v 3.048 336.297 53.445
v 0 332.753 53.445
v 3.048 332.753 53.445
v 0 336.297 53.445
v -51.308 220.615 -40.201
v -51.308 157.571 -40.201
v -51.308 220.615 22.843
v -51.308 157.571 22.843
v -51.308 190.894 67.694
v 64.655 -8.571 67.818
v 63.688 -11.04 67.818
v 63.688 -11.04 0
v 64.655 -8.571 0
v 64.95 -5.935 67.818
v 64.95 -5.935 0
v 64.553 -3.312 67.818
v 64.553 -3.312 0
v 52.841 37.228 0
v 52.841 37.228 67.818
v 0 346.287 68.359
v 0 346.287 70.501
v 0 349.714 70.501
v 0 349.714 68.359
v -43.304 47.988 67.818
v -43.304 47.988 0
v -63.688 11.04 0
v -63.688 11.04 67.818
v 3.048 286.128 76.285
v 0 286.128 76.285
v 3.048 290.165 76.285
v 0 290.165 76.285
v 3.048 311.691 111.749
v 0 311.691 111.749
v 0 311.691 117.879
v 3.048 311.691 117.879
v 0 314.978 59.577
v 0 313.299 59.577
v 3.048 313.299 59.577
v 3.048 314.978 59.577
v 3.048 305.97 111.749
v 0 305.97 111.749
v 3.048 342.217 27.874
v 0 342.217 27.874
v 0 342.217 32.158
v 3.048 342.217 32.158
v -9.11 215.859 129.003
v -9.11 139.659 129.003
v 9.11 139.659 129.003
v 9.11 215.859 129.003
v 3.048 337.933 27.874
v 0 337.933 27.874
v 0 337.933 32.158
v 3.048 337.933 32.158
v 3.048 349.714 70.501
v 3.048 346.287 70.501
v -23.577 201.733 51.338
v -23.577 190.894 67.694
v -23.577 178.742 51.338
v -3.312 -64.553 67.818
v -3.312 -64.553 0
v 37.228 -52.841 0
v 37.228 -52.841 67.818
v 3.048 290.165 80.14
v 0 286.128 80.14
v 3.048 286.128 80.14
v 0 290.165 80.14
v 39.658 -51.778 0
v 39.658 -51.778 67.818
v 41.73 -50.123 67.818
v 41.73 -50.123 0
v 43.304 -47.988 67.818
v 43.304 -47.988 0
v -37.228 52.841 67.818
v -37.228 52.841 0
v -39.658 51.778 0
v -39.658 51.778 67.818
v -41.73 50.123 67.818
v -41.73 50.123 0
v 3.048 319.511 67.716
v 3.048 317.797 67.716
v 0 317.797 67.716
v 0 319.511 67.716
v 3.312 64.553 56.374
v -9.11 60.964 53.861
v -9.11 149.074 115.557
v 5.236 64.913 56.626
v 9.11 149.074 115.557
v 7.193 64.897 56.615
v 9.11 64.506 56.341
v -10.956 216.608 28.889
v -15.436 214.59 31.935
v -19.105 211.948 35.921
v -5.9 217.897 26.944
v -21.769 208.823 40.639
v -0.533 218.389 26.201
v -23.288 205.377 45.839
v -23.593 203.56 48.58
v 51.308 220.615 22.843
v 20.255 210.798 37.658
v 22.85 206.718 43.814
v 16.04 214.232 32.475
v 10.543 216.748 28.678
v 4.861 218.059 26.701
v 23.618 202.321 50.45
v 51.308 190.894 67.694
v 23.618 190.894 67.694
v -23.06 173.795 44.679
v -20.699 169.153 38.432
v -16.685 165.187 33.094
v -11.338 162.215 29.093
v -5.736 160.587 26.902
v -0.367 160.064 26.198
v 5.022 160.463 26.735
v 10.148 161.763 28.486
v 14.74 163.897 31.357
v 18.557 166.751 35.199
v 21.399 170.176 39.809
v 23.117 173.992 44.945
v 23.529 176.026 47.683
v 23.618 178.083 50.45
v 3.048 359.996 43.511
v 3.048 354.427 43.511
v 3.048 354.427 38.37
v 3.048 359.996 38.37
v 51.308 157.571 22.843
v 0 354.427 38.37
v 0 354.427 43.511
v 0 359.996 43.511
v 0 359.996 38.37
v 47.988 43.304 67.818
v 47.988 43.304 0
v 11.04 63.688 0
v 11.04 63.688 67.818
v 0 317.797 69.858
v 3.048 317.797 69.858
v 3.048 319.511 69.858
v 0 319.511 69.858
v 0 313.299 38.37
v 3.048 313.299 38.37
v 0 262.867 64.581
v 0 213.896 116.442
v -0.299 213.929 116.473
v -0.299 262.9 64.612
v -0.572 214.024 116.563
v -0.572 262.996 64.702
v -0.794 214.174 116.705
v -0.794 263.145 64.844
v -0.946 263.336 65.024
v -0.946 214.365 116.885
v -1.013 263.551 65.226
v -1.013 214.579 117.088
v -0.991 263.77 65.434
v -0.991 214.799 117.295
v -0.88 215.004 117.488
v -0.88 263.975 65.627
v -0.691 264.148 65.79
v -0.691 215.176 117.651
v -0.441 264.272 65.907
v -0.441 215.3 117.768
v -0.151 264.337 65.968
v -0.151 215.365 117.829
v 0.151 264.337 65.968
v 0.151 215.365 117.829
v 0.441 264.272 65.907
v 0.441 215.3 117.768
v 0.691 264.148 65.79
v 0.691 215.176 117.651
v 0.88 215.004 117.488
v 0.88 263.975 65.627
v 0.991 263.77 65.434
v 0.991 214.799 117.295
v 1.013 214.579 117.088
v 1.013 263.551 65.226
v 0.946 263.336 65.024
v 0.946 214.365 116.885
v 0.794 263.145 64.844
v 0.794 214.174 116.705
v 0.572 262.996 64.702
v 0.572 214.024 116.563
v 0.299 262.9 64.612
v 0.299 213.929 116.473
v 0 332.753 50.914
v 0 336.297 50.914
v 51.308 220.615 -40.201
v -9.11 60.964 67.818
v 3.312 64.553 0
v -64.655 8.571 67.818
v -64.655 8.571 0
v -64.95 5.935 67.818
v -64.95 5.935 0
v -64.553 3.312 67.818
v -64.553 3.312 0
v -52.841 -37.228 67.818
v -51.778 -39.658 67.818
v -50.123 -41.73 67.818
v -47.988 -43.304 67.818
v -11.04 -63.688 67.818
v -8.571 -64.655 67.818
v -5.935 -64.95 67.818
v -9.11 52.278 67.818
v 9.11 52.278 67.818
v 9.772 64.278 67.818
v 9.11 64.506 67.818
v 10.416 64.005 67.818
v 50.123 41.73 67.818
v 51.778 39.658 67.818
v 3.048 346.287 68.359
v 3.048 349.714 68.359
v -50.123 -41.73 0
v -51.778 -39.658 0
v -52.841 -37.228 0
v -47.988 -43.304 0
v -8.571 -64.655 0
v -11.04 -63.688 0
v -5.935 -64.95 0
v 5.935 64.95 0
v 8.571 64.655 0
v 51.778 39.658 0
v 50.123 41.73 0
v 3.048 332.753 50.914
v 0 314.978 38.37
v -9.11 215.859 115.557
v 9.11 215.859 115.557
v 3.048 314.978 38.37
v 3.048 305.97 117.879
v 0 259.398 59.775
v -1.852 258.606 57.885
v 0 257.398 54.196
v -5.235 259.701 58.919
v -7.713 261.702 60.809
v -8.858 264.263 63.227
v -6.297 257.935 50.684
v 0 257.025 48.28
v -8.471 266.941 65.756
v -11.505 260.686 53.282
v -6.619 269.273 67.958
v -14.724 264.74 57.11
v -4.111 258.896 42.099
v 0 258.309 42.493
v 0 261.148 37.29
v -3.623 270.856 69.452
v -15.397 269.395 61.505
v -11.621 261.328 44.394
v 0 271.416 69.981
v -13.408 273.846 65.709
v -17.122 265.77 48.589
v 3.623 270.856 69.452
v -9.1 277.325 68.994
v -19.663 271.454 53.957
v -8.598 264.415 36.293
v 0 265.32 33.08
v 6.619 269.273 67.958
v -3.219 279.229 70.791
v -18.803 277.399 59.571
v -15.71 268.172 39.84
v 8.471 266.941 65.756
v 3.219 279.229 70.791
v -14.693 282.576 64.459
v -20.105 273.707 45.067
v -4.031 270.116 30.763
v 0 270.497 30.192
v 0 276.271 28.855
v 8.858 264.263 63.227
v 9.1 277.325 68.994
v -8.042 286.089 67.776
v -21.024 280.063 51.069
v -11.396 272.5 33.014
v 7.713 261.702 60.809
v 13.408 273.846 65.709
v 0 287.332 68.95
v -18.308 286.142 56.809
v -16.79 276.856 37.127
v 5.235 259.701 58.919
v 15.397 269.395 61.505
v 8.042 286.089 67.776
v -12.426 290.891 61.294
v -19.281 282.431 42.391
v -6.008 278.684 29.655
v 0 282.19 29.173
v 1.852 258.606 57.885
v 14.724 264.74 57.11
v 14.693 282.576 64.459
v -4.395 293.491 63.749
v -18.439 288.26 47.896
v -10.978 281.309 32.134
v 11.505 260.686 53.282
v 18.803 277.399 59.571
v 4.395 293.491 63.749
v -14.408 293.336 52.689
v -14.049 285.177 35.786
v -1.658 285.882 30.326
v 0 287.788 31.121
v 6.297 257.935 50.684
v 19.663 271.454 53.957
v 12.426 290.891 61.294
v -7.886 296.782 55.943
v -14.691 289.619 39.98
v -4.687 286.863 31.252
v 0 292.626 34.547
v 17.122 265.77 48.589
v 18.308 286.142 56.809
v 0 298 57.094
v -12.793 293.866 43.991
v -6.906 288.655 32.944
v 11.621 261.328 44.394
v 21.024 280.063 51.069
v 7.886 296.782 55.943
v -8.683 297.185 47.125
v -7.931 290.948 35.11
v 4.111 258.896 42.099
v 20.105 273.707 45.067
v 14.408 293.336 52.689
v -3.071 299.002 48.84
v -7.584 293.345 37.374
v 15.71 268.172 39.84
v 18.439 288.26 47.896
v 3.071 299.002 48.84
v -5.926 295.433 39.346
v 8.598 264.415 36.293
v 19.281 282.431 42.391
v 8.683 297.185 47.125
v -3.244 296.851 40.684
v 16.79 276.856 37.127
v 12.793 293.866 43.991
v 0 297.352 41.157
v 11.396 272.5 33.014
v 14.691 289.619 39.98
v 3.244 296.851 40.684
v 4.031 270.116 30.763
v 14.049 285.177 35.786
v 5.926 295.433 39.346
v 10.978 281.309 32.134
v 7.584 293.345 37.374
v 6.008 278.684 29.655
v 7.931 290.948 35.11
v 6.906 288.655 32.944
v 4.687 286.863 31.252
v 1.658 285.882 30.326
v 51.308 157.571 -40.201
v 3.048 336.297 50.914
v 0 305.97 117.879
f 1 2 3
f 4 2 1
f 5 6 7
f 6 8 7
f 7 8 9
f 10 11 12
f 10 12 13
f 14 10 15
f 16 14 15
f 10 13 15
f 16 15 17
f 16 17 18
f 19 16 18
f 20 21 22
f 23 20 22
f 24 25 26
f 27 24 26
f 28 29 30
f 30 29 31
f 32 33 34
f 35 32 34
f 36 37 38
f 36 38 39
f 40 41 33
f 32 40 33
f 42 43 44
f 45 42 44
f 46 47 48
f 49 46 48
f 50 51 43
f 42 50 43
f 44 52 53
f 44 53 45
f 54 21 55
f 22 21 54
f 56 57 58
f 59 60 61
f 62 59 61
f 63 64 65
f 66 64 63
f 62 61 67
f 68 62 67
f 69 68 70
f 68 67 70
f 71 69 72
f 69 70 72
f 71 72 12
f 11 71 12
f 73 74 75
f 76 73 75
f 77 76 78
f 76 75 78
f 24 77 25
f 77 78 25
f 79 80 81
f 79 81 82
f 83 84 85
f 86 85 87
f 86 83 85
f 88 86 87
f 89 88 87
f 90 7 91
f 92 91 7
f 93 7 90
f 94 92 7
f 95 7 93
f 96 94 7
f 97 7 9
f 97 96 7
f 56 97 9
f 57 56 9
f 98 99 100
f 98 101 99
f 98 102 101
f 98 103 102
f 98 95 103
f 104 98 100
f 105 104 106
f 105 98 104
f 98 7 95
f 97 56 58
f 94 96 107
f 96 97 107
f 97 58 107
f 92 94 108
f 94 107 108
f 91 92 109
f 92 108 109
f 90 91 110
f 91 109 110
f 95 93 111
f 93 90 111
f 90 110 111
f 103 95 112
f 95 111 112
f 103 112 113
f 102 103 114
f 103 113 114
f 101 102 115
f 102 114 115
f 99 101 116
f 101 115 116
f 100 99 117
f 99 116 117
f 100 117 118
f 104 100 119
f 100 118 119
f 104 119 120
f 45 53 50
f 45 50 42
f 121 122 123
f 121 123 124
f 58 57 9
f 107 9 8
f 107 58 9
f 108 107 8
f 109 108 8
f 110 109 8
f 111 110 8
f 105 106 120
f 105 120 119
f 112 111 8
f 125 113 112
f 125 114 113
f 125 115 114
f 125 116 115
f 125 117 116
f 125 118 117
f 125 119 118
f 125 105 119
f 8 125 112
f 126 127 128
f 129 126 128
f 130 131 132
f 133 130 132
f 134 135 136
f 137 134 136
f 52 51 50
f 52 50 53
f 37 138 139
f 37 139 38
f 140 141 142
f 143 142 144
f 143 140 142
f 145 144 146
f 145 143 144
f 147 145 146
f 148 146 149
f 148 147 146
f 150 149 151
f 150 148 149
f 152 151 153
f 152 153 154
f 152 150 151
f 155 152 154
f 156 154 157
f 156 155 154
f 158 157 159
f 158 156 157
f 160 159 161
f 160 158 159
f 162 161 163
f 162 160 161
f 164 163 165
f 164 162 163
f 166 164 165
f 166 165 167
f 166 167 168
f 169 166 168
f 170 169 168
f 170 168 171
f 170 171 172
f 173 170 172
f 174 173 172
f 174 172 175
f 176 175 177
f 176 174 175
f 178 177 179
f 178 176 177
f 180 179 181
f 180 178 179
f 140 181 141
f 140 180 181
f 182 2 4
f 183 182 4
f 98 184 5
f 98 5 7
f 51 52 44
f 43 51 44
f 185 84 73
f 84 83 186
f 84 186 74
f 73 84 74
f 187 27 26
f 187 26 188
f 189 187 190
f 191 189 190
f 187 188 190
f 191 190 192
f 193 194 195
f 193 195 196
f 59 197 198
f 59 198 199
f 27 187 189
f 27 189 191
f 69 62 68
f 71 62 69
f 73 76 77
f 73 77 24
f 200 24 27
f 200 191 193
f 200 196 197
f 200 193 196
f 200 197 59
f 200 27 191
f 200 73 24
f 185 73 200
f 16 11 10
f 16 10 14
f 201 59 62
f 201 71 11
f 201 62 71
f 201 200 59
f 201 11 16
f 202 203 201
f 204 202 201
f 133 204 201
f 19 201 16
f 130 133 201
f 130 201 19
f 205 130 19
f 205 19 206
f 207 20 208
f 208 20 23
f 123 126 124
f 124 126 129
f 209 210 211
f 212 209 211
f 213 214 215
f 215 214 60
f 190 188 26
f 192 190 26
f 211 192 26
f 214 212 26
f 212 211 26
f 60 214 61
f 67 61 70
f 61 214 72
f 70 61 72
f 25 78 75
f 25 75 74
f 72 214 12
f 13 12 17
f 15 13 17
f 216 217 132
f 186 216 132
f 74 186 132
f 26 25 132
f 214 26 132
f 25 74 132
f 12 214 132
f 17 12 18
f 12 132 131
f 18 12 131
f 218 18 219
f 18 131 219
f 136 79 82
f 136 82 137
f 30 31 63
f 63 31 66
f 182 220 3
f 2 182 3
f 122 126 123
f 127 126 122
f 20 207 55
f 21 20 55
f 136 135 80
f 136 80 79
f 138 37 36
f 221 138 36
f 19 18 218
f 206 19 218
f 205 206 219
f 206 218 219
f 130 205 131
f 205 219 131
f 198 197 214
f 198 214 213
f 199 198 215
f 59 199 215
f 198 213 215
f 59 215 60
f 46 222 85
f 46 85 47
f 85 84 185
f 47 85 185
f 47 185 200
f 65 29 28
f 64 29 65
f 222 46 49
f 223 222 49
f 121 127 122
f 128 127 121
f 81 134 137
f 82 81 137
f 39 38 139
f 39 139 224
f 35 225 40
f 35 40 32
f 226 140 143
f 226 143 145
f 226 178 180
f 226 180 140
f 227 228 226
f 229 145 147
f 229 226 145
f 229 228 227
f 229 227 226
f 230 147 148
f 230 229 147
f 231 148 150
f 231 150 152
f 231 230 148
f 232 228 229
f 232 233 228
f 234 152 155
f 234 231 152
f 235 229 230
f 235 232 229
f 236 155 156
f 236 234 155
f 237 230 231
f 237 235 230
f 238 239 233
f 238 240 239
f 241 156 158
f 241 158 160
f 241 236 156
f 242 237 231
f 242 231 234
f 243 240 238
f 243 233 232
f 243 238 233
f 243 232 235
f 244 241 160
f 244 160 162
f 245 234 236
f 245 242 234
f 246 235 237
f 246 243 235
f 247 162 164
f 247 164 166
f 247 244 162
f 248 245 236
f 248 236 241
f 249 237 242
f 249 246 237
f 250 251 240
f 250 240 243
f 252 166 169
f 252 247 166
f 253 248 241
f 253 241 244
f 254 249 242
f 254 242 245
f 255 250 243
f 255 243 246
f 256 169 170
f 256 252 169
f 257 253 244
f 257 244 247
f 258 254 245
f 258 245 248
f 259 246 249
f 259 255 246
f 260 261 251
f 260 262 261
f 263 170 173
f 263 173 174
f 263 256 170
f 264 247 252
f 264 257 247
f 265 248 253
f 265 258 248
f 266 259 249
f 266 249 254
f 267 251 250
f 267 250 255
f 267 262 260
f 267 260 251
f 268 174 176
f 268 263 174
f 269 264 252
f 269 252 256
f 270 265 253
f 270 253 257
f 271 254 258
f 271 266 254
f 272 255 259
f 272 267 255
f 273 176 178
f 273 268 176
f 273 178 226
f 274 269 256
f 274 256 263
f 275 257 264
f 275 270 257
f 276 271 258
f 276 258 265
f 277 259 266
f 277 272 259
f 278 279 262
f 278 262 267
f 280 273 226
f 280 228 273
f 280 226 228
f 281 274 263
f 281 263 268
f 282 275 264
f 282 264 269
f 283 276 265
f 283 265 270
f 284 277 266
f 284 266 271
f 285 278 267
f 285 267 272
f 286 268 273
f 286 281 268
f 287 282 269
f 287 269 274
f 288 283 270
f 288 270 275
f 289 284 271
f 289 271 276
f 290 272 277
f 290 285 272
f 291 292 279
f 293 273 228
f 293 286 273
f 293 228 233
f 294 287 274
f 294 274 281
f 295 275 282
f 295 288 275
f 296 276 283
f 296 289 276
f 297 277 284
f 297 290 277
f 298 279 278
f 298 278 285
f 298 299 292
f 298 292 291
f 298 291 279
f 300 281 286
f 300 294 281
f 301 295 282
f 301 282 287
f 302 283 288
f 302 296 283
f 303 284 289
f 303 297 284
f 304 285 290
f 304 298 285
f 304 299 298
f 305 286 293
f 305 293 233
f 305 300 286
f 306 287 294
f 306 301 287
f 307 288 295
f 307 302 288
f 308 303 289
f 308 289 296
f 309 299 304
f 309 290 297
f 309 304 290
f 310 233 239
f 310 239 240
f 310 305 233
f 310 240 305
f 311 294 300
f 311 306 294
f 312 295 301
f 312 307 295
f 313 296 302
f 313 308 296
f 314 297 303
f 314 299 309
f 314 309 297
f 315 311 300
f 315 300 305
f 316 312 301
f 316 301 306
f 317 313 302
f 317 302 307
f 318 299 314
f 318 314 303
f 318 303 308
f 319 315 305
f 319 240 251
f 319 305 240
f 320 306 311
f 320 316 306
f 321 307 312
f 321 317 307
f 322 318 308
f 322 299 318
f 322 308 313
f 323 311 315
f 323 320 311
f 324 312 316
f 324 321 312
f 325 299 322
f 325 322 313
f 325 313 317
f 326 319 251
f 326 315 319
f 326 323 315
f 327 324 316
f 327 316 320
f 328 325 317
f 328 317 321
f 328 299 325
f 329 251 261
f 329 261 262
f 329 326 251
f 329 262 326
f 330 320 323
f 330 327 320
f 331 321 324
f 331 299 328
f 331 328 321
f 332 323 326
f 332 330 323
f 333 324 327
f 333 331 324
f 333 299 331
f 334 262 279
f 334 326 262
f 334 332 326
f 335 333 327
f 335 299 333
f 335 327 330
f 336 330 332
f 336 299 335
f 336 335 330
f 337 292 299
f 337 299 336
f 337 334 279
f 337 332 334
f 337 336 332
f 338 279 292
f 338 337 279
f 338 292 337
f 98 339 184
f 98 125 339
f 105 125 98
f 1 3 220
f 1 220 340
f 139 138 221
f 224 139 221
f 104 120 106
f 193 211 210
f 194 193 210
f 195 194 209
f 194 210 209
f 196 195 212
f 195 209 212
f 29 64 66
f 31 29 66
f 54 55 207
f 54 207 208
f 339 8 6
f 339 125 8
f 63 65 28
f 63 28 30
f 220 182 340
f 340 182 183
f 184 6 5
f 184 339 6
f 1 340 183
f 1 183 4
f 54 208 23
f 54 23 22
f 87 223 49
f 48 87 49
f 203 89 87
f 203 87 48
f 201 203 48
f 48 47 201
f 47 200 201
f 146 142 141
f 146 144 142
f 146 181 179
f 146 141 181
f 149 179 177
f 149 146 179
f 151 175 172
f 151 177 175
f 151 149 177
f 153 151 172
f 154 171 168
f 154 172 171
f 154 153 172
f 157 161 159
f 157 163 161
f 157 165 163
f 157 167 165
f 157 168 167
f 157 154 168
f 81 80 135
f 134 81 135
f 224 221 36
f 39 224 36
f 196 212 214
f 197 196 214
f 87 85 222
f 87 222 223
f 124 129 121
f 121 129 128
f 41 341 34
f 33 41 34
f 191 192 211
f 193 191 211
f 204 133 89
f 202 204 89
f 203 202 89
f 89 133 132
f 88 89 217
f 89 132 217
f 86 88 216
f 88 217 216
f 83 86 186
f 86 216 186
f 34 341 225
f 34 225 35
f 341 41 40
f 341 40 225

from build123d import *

# Parameters (mm, degrees)
F1_DEPTH      = 67.818
F4_W          = 18.2206444442
F4_H          = 16.4148422464
F5_DEPTH      = 35.052
F5_DEPTH_BACK = 81.28
F7_W          = 18.2206444442
F7_H          = 13.4462515828
F8_DEPTH      = 76.2
F12_DEPTH     = 51.308
F14_DEPTH     = 307.34
F15_W         = 3.5439252173
F15_H         = 2.5313720107
F16_DEPTH     = 3.048
F15_W_2       = 5.5693387985
F15_H_2       = 5.1409378648
F15_W_3       = 4.2840838432
F15_H_3       = 4.2841136456
F15_W_4       = 1.7136335373
F15_H_4       = 2.1420568228
F15_W_5       = 1.678943634
F15_H_5       = 21.2063714862
F15_W_6       = 4.0373813916
F15_H_6       = 3.8556978106
F15_W_7       = 3.4273266792
F15_W_8       = 5.7214427742
F15_H_7       = 6.1301365495


with BuildPart() as f1:
    # F0 (on Top) → F1 (new body)
    with BuildSketch(Plane.XY):
        with BuildLine():
            Line((-3.3124033153, -64.5529893688), (37.227621348, -52.8409373586))
            ThreePointArc((37.227621348, -52.8409373586), (40.7482742502, -51.0188053655), (43.3036336822, -47.9880793748))
            Line((43.3036336822, -47.9880793748), (63.6880886331, -11.0402816279))
            ThreePointArc((63.6880886331, -11.0402816279), (64.8891242859, -7.262362198), (64.5529893688, -3.3124033153))
            Line((64.5529893688, -3.3124033153), (52.8409373586, 37.227621348))
            ThreePointArc((52.8409373586, 37.227621348), (51.0188053655, 40.7482742502), (47.9880793748, 43.3036336822))
            Line((47.9880793748, 43.3036336822), (11.0402816279, 63.6880886331))
            ThreePointArc((11.0402816279, 63.6880886331), (7.262362198, 64.8891242859), (3.3124033153, 64.5529893688))
            Line((3.3124033153, 64.5529893688), (-37.227621348, 52.8409373586))
            ThreePointArc((-37.227621348, 52.8409373586), (-40.7482742502, 51.0188053655), (-43.3036336822, 47.9880793748))
            Line((-43.3036336822, 47.9880793748), (-63.6880886331, 11.0402816279))
            ThreePointArc((-63.6880886331, 11.0402816279), (-64.8891242859, 7.262362198), (-64.5529893688, 3.3124033153))
            Line((-64.5529893688, 3.3124033153), (-52.8409373586, -37.227621348))
            ThreePointArc((-52.8409373586, -37.227621348), (-51.0188053655, -40.7482742502), (-47.9880793748, -43.3036336822))
            Line((-47.9880793748, -43.3036336822), (-11.0402816279, -63.6880886331))
            ThreePointArc((-11.0402816279, -63.6880886331), (-7.262362198, -64.8891242859), (-3.3124033153, -64.5529893688))
        make_face()
    extrude(amount=F1_DEPTH)

    # F4 (on line) → F5 (join, two sides)
    with BuildSketch(Plane(origin=(0, 87.7434991713, 61.4386595487), x_dir=(1, 0, 0), z_dir=(0, -0.8191520443, -0.5735764364))) as f5_sk:
        with Locations((0, 17.3605981536)):
            Rectangle(F4_W, F4_H)
    extrude(amount=F5_DEPTH)
    extrude(f5_sk.sketch, amount=-F5_DEPTH_BACK)

    # F7 (on plane+point) → F8 (join)
    with BuildSketch(Plane.XZ.offset(-139.6589639498)):
        with Locations((0, 122.2799217629)):
            Rectangle(F7_W, F7_H)
    extrude(amount=-F8_DEPTH)


with BuildPart() as f10:
    # F9 (on Right) → F10 (revolve)
    with BuildSketch(Plane.YZ):
        with BuildLine():
            Line((213.895842433, 116.4420843124), (262.8673623017, 64.581070459))
            ThreePointArc((262.8673623017, 64.581070459), (263.0859847021, 35.038088053), (292.6256896875, 34.5467281301))
            Line((292.6256896875, 34.5467281301), (278.1074935259, 49.9215495422))
            Line((278.1074935259, 49.9215495422), (214.6345443587, 117.1396286399))
            Line((214.6345443587, 117.1396286399), (213.895842433, 116.4420843124))
        make_face()
    revolve(axis=Axis((0, 246.3710189423, 83.5305890911), (0, 0.6865618304, -0.7270714222)))


with BuildPart() as f12:
    # F11 (on Right) → F12 (new body, symmetric)
    with BuildSketch(Plane.YZ):
        Polygon((157.5710592777, -40.2006159251), (220.6147791832, -40.2006159251), (220.6147791832, 22.8431193803), (190.8941715956, 67.6941946149), (157.5710592777, 22.8431193803), align=None)
    extrude(amount=F12_DEPTH, both=True)

    # F13 (on Front) → F14 (cut)
    with BuildSketch(Plane.XZ):
        with BuildLine():
            Line((-23.5774199521, 92.2675209238), (-23.5774199521, 51.3375234856))
            ThreePointArc((-23.5774199521, 51.3375234856), (-0.4440142616, 26.1994476979), (23.6177416804, 50.4504108568))
            Line((23.6177416804, 50.4504108568), (23.6177416804, 86.8789901563))
            Line((23.6177416804, 86.8789901563), (-23.5774199521, 92.2675209238))
        make_face()
    extrude(amount=-F14_DEPTH, mode=Mode.SUBTRACT)


with BuildPart() as f16:
    # F15 (on Right) → F16 (new body)
    with BuildSketch(Plane.YZ):
        with Locations((334.5247149807, 52.1797649562)):
            Rectangle(F15_W, F15_H)
    extrude(amount=F16_DEPTH)


with BuildPart() as f16b:
    # F15 (on Right) → F16, piece 2 (new body)
    with BuildSketch(Plane.YZ):
        with Locations((357.2113215923, 40.9406758845)):
            Rectangle(F15_W_2, F15_H_2)
    extrude(amount=F16_DEPTH)


with BuildPart() as f16c:
    # F15 (on Right) → F16, piece 3 (new body)
    with BuildSketch(Plane.YZ):
        with Locations((340.0748670101, 30.0161801279)):
            Rectangle(F15_W_3, F15_H_3)
    extrude(amount=F16_DEPTH)


with BuildPart() as f16d:
    # F15 (on Right) → F16, piece 4 (new body)
    with BuildSketch(Plane.YZ):
        with Locations((318.6542987823, 68.7874257565)):
            Rectangle(F15_W_4, F15_H_4)
    extrude(amount=F16_DEPTH)


with BuildPart() as f16e:
    # F15 (on Right) → F16, piece 5 (new body)
    with BuildSketch(Plane.YZ):
        with Locations((314.1385912895, 48.9733926952)):
            Rectangle(F15_W_5, F15_H_5)
    extrude(amount=F16_DEPTH)


with BuildPart() as f16f:
    # F15 (on Right) → F16, piece 6 (new body)
    with BuildSketch(Plane.YZ):
        with Locations((288.1462270116, 78.2124809921)):
            Rectangle(F15_W_6, F15_H_6)
    extrude(amount=F16_DEPTH)


with BuildPart() as f16g:
    # F15 (on Right) → F16, piece 7 (new body)
    with BuildSketch(Plane.YZ):
        with Locations((348.0004966259, 69.4300457835)):
            Rectangle(F15_W_7, F15_H_4)
    extrude(amount=F16_DEPTH)


with BuildPart() as f16h:
    # F15 (on Right) → F16, piece 8 (new body)
    with BuildSketch(Plane.YZ):
        with Locations((308.8307416065, 114.8136593401)):
            Rectangle(F15_W_8, F15_H_7)
    extrude(amount=F16_DEPTH)


solid = Compound([f1.part, f10.part, f12.part, f16.part, f16b.part, f16c.part, f16d.part, f16e.part, f16f.part, f16g.part, f16h.part])
